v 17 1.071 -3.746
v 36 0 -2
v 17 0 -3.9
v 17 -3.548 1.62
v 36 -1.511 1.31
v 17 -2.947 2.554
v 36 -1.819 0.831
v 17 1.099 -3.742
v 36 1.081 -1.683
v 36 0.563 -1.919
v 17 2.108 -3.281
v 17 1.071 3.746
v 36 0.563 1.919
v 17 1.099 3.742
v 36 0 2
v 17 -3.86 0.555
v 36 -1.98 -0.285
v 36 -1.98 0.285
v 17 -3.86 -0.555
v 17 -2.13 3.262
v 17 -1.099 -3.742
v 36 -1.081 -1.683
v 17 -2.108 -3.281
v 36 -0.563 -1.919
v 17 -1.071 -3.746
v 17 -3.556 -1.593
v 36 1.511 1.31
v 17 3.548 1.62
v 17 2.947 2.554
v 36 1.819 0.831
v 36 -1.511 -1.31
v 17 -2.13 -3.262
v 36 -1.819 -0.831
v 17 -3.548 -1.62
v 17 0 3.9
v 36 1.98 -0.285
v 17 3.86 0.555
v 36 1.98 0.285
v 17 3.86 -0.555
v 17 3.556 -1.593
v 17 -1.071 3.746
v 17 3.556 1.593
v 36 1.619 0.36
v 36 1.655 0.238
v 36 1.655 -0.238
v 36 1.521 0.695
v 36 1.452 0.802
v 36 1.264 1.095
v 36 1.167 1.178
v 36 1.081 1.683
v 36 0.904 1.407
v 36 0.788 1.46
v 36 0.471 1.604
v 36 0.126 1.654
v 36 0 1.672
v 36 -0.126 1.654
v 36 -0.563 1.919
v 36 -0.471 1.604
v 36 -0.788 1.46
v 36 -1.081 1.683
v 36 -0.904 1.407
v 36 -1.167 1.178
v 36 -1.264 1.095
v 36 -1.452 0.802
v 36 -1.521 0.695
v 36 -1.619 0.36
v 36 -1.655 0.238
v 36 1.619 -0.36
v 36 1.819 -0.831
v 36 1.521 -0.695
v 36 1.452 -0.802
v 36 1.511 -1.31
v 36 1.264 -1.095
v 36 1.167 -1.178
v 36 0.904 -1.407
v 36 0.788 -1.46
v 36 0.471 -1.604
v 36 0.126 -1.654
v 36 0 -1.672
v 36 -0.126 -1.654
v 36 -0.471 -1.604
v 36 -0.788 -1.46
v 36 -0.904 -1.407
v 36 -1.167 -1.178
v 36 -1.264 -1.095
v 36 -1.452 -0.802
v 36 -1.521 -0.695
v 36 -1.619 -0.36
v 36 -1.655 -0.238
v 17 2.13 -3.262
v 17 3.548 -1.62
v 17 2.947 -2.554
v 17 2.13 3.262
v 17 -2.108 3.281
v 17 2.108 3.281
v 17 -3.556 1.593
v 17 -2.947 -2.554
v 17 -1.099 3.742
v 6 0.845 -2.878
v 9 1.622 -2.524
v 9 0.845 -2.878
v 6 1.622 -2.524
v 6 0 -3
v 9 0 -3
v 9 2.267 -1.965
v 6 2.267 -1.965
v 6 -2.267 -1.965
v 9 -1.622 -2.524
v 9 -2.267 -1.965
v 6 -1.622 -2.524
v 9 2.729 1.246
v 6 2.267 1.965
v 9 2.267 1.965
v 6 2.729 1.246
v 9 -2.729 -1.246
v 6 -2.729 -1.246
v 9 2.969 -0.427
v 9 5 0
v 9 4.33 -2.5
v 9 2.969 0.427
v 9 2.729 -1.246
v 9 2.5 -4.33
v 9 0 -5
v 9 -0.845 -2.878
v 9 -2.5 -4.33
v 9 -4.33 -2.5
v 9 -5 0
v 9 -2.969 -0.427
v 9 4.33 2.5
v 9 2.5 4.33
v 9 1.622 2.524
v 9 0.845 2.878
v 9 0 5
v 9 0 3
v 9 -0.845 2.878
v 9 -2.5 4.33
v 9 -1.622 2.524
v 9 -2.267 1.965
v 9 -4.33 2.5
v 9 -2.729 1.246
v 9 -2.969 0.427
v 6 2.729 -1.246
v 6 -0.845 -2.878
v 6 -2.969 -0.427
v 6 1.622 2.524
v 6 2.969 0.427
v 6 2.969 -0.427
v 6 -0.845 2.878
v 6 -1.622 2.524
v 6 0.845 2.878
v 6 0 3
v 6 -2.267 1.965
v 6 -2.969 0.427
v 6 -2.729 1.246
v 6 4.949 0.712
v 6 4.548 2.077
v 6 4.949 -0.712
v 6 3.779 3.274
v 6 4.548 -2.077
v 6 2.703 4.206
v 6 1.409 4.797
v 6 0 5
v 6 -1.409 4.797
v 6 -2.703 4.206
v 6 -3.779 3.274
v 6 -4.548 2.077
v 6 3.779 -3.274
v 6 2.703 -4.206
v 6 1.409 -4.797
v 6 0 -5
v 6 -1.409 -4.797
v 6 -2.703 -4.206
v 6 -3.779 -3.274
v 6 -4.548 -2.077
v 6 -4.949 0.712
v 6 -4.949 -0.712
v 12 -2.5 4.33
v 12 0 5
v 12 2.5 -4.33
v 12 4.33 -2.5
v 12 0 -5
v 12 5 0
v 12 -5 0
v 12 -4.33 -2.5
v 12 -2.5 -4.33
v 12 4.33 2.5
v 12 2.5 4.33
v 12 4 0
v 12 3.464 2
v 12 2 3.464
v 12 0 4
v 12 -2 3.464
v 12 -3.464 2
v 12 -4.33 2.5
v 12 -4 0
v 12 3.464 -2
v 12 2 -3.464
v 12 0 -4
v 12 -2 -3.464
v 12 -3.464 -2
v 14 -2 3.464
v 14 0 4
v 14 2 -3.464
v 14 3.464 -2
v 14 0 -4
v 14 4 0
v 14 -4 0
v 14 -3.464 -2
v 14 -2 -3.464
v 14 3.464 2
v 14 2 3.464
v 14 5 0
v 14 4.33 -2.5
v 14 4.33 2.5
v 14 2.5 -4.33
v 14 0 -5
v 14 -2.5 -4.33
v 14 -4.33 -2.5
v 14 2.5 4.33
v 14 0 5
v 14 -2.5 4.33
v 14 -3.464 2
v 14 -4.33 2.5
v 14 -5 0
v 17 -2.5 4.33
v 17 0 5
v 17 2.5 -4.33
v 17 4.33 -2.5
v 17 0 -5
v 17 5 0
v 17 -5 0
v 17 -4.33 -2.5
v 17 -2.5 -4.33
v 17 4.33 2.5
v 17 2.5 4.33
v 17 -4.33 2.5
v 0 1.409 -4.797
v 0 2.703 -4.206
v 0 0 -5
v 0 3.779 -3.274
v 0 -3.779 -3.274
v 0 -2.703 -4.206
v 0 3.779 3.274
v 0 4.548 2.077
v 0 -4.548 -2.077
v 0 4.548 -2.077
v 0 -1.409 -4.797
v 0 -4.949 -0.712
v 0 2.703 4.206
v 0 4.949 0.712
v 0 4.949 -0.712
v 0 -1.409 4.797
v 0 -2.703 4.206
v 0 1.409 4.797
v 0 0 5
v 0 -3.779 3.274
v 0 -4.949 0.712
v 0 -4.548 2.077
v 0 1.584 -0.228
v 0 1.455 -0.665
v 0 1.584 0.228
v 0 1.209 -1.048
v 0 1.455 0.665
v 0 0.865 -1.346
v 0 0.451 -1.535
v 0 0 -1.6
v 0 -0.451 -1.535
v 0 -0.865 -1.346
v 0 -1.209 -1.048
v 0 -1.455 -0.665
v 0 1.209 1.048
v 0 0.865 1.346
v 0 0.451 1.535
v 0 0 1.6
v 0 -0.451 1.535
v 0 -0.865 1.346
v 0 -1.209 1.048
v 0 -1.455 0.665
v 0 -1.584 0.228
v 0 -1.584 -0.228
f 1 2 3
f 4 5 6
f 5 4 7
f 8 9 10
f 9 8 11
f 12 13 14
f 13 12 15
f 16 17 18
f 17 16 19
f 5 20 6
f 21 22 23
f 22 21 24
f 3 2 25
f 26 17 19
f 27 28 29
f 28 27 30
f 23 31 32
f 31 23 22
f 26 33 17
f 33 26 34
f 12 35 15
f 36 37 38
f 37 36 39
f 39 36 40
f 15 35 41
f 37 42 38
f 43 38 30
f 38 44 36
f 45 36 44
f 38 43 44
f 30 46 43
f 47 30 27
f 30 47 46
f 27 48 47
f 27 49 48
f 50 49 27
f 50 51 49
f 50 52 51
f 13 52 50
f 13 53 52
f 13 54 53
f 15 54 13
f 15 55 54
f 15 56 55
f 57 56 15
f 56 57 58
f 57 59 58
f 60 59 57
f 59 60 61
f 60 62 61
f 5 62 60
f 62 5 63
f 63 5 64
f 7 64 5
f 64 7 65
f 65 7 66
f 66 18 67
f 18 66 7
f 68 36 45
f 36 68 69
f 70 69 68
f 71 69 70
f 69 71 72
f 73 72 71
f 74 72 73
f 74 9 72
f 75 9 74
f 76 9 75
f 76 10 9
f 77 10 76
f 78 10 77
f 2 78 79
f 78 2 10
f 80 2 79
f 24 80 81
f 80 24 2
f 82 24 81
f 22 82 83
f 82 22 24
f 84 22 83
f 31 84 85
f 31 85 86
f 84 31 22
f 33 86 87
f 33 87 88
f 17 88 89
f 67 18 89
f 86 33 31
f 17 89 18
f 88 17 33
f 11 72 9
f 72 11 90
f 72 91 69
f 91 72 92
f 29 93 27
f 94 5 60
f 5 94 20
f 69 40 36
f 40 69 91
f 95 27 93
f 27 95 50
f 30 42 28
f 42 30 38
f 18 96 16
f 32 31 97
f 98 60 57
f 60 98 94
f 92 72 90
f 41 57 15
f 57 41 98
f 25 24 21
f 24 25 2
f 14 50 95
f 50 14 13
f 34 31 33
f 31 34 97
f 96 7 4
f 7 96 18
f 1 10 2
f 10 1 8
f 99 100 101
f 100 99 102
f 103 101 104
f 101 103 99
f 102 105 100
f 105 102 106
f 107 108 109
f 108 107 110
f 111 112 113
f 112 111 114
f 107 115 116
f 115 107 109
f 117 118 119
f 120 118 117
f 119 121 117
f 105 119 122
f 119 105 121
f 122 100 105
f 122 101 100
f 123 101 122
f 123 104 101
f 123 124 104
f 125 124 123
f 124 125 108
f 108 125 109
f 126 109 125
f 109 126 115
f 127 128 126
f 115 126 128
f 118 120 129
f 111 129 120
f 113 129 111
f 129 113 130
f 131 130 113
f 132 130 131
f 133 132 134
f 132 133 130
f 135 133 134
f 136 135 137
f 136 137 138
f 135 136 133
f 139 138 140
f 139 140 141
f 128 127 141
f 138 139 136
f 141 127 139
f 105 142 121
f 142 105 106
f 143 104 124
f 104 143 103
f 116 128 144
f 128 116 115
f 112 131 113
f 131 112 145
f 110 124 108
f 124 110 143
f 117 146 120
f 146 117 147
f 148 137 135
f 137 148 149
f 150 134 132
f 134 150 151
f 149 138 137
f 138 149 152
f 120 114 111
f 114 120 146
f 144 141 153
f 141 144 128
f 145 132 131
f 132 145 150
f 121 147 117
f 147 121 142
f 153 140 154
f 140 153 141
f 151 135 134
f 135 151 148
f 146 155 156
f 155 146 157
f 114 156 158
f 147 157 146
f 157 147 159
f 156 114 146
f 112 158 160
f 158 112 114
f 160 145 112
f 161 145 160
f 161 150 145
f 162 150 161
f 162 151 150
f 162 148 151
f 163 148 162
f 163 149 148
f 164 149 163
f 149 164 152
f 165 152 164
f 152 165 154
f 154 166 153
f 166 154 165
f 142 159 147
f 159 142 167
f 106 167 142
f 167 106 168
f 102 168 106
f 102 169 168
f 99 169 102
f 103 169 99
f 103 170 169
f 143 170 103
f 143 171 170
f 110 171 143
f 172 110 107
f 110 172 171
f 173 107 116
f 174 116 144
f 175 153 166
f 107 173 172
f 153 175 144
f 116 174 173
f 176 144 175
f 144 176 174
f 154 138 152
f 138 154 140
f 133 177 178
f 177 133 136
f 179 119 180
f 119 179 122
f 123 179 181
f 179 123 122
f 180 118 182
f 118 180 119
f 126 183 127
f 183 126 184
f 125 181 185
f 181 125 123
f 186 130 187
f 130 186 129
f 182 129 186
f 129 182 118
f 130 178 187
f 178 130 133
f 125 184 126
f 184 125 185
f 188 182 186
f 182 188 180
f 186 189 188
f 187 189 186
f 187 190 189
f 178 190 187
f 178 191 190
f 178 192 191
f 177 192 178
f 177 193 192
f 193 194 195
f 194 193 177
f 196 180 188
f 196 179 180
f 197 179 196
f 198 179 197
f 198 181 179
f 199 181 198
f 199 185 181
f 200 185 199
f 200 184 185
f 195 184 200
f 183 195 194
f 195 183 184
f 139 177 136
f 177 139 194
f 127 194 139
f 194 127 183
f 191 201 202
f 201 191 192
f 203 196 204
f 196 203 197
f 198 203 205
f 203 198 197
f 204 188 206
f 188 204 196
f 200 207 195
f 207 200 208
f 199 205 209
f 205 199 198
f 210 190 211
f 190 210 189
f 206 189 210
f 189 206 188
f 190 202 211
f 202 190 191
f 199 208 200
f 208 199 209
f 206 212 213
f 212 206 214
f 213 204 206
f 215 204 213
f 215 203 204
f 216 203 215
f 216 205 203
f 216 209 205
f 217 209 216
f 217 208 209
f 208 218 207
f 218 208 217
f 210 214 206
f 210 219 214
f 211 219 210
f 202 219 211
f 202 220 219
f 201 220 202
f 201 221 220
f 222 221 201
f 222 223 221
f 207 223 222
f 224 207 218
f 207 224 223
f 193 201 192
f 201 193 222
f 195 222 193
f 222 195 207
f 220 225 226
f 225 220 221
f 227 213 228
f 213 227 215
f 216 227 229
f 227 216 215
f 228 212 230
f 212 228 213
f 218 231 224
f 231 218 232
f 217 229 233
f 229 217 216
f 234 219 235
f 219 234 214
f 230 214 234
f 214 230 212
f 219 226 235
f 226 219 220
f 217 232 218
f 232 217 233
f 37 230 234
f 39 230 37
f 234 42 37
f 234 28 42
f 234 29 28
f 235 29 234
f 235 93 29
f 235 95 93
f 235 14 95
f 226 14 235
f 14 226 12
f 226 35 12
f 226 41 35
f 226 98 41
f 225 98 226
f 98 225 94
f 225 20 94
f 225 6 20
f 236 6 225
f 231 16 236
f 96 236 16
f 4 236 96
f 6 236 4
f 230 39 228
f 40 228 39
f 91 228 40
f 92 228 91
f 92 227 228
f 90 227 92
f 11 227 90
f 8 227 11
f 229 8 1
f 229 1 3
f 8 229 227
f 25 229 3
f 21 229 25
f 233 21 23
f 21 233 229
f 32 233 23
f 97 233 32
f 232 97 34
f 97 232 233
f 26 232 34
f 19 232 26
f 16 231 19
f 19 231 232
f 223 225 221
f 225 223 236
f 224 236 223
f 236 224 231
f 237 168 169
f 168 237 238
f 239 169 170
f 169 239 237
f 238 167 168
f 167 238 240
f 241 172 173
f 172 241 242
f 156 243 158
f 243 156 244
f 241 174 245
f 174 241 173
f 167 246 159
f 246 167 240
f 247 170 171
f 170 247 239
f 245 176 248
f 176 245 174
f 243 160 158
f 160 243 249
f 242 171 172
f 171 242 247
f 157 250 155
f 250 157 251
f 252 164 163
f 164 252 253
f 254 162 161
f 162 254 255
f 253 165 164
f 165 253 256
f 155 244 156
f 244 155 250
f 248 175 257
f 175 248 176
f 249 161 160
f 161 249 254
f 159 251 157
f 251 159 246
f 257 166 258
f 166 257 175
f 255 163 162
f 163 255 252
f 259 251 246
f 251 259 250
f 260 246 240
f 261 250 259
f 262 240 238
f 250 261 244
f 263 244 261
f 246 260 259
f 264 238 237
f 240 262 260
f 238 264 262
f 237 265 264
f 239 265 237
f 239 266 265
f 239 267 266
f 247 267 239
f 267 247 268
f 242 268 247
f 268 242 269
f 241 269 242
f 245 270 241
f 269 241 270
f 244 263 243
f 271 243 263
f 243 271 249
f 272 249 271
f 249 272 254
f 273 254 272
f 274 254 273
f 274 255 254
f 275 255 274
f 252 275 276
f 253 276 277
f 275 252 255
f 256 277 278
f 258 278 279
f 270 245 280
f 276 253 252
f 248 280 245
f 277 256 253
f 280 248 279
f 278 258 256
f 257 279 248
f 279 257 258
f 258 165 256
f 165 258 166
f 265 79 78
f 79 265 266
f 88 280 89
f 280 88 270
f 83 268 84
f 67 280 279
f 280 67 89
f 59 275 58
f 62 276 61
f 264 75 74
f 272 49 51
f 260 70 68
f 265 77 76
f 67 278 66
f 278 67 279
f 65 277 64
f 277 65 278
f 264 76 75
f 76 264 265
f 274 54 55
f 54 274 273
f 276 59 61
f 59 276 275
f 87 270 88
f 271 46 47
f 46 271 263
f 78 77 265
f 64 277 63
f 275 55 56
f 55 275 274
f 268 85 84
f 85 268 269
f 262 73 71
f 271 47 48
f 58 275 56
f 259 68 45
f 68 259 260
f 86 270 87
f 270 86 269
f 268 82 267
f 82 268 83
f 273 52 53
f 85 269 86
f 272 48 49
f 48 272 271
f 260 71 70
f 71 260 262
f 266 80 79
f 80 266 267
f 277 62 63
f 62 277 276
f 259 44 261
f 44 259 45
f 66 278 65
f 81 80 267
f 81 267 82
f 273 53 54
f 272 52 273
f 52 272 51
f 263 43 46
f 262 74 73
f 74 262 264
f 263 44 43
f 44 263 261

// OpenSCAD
// Lights1b
// Ferrules for 3 mm fiber optic sideglows

tol=0;

rotate([0,90,0])
difference(){
union(){
//------------
// First jacket
translate([0,0,16]) color("green")
cylinder(r1=4+tol,r2=2+tol,h=20,$fn=22);

//------------
// Narrow part
translate([0,0,6]) color("pink")
cylinder(r1=3+tol,r2=3+tol,h=3,$fn=22);

//------------
// wide part
translate([0,0,9]) color("red")
cylinder(r1=5+tol,r2=5+tol,h=3,$fn=12);
translate([0,0,12]) color("red")
cylinder(r1=4+tol,r2=4+tol,h=2,$fn=12);
translate([0,0,14]) color("red")
cylinder(r1=5+tol,r2=5+tol,h=3,$fn=12);

//-------------
//  head
translate([0,0,0]) color("orange")
cylinder(r1=5+tol,r2=5+tol,h=6,$fn=22);

}

//-------
// Fiber
color("cyan")
cylinder(r1=1.6,r2=1.7, h=50,$fn=22);
}
